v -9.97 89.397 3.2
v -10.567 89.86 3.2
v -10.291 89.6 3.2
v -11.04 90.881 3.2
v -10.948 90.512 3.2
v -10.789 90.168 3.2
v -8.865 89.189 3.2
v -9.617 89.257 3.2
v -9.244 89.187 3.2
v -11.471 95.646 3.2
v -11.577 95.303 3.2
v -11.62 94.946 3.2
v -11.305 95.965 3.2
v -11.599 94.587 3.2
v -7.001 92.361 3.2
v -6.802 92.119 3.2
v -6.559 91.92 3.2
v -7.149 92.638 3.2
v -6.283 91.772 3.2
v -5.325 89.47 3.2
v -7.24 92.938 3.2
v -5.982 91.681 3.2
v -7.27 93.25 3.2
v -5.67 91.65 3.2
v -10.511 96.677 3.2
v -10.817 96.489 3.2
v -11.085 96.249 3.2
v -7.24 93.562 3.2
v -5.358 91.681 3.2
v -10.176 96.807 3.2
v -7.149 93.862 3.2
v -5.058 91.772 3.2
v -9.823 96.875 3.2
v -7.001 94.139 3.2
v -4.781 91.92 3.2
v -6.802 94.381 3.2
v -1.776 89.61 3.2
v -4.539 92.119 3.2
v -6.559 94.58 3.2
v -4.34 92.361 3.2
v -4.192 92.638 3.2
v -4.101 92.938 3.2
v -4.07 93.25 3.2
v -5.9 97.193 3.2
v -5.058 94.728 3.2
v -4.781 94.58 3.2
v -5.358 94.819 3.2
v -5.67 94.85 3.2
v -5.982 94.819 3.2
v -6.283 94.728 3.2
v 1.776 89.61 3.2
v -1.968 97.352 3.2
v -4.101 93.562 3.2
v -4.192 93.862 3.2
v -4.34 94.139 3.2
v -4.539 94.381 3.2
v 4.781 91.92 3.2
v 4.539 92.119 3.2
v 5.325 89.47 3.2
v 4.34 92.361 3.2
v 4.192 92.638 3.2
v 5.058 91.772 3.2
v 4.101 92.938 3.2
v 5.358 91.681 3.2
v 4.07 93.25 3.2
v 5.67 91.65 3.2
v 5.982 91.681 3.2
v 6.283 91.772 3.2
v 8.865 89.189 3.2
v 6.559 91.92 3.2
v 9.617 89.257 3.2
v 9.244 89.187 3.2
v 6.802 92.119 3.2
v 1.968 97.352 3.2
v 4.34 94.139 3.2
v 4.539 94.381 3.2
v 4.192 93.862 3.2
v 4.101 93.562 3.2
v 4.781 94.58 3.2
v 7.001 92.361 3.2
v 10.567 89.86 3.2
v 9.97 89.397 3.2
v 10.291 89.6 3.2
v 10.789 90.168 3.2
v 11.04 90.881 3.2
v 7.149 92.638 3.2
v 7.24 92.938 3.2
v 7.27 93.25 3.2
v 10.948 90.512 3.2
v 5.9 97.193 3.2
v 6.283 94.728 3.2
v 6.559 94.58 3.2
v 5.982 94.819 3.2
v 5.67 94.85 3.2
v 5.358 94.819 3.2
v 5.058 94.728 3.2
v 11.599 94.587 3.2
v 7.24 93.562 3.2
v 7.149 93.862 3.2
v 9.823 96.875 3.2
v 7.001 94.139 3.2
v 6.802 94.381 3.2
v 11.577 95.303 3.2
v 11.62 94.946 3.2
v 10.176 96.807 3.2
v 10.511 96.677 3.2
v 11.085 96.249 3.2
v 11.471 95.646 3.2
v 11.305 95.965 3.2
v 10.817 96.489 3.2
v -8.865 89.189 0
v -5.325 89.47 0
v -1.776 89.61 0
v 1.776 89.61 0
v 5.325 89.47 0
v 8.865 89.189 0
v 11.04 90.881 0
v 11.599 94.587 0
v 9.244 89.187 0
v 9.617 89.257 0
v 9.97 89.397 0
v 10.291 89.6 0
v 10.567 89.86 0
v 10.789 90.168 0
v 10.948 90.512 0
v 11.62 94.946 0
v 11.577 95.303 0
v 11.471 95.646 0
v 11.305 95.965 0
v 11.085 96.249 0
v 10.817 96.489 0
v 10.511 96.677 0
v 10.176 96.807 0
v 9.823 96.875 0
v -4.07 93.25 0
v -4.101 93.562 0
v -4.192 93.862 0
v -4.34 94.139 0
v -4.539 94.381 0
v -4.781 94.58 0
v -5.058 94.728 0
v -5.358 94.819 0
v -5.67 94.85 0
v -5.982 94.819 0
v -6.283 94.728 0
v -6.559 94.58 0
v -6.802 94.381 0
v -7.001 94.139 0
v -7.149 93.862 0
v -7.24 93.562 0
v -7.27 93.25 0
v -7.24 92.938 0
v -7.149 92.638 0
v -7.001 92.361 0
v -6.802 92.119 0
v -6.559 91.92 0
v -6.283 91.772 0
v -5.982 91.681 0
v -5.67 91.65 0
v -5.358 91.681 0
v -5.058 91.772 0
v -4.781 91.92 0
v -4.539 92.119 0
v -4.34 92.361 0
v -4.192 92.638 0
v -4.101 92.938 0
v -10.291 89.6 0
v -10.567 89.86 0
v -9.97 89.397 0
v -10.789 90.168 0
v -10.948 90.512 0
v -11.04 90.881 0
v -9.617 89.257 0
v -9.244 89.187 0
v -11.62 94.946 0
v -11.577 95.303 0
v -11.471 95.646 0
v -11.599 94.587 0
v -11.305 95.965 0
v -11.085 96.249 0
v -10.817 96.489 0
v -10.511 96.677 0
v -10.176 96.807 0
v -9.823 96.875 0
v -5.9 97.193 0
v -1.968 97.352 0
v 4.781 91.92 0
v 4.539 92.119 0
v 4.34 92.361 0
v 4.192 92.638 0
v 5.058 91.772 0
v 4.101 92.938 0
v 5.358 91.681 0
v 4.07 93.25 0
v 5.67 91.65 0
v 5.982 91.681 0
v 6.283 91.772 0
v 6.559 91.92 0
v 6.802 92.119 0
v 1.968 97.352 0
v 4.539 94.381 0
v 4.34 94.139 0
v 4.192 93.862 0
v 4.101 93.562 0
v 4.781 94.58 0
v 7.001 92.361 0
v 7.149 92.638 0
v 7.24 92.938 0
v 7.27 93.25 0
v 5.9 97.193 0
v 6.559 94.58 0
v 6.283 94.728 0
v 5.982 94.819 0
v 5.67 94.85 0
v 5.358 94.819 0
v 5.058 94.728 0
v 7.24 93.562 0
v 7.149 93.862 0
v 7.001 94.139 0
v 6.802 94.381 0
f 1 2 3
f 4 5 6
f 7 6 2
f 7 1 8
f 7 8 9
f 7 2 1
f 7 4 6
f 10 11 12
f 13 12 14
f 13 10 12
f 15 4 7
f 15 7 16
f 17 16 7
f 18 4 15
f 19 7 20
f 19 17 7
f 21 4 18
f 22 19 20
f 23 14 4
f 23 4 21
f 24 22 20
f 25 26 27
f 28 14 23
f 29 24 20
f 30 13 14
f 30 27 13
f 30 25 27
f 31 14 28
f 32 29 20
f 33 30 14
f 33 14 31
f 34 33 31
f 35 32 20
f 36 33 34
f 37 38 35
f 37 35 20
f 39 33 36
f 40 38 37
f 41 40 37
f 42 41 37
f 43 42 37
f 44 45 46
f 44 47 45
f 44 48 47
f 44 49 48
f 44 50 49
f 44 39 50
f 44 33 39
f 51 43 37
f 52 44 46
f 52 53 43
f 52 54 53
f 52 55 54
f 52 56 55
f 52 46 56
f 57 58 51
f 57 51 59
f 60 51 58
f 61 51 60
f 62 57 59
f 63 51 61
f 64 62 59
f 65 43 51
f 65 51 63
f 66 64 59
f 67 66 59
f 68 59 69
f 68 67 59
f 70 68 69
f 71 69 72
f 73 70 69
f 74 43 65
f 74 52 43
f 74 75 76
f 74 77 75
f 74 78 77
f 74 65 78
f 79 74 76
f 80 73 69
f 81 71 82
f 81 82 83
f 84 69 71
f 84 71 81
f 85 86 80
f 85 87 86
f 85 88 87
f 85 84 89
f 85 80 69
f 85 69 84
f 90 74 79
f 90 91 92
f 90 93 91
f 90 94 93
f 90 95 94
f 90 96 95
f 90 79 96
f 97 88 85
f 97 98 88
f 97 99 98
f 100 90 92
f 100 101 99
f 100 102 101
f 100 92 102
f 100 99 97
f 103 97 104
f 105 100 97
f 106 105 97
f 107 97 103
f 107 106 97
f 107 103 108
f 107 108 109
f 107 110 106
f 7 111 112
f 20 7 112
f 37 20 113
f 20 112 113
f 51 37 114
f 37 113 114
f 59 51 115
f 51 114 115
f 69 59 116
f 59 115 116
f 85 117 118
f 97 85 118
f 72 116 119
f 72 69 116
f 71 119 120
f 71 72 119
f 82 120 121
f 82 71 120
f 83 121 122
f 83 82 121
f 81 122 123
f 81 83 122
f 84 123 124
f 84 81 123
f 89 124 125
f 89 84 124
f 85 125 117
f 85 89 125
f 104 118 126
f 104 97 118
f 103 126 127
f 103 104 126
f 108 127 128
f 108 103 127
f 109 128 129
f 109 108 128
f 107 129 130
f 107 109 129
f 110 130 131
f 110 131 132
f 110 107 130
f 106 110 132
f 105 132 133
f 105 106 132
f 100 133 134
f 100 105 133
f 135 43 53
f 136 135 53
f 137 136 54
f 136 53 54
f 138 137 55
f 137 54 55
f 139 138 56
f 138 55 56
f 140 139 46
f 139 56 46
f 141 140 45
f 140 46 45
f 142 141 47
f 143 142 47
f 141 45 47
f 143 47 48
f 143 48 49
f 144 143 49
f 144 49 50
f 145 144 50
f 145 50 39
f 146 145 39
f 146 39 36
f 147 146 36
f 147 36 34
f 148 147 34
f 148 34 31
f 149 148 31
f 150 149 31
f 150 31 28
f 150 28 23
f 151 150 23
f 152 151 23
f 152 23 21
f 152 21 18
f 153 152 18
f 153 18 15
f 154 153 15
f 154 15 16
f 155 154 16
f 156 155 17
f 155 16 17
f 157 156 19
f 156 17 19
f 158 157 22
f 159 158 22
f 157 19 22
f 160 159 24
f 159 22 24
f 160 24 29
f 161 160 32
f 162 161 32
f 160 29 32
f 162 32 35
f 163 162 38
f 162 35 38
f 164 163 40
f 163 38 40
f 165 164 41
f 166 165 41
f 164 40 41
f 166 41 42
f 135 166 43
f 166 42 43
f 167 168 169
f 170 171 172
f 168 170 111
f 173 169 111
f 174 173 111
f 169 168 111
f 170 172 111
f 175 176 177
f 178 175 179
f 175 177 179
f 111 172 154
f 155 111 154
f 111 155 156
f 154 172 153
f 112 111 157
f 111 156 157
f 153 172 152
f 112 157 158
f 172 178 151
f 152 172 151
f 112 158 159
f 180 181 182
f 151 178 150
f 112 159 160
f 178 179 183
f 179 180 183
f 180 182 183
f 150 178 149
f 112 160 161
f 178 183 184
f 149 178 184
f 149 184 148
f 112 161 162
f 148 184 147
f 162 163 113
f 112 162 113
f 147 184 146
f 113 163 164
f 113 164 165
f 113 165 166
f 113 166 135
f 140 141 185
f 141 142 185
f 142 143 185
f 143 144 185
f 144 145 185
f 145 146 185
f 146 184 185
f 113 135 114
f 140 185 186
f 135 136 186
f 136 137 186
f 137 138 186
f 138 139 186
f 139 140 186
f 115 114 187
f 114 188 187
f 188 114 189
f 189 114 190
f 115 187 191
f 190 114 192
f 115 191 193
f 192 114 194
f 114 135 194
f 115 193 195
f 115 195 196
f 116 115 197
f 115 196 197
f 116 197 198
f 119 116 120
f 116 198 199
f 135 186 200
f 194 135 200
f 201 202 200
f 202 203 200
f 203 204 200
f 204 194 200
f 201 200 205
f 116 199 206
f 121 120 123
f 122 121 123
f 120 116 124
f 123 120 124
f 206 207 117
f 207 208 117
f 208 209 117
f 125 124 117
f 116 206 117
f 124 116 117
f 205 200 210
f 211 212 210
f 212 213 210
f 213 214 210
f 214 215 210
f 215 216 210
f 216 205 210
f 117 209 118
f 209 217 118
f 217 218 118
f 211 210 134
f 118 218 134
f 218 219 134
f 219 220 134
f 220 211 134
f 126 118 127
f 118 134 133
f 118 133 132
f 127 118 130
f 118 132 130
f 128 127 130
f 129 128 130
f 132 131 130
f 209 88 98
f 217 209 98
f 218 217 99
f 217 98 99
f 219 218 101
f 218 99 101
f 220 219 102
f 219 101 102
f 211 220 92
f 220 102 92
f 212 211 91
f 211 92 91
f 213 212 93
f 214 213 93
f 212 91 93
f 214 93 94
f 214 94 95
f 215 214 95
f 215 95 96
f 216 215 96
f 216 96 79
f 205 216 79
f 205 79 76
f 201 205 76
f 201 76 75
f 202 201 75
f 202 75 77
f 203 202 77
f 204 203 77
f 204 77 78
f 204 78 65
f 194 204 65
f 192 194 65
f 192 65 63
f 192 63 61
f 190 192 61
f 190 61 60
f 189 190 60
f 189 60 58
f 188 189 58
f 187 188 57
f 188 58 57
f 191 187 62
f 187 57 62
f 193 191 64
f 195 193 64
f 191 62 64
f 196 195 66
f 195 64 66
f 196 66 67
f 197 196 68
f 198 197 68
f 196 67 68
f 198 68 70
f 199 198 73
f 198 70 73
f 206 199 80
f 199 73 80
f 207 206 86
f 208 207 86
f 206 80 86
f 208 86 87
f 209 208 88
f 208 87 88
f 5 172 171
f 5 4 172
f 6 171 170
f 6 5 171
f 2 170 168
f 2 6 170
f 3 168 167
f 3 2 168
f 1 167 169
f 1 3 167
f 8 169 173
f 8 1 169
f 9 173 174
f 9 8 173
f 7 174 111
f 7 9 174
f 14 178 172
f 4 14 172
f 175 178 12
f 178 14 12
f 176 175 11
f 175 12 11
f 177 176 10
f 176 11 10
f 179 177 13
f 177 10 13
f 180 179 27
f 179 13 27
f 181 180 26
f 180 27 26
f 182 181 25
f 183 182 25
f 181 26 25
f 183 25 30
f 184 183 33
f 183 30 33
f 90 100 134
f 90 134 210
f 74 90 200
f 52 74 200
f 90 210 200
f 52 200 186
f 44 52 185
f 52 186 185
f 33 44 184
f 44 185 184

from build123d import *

# Parameters (mm, degrees)
BOSS_EXTRUDE1_DEPTH = 3.2
FILLET1_R           = 2
SKETCH2_R           = 1.6
CUT_EXTRUDE1_DEPTH  = 99.11525581


with BuildPart() as part:
    # Sketch1 → Boss-Extrude1 (new body)
    with BuildSketch(Plane.XY):
        with BuildLine():
            Line((-11.908609546, 96.641044089), (-10.753969279, 88.980506454))
            ThreePointArc((-10.753969279, 88.980506454), (0, 89.628), (10.753969279, 88.980506454))
            Line((10.753969279, 88.980506454), (11.908609546, 96.641044089))
            ThreePointArc((11.908609546, 96.641044089), (0, 97.372), (-11.908609546, 96.641044089))
        make_face()
    extrude(amount=BOSS_EXTRUDE1_DEPTH)

    # Fillet1
    fillet1_edges = [part.edges().sort_by_distance(p)[0] for p in [
        (11.908609546, 96.641044089, 1.6),
        (10.753969279, 88.980506454, 1.6),
        (-10.753969279, 88.980506454, 1.6),
        (-11.908609546, 96.641044089, 1.6),
    ]]
    fillet(fillet1_edges, radius=FILLET1_R)

    # Sketch2 → Cut-Extrude1 (cut, through all)
    with BuildSketch(Plane.XY.offset(3.2)):
        with Locations((-5.670312341, 93.250077468)):
            Circle(SKETCH2_R)
        with Locations((5.670312341, 93.250077468)):
            Circle(SKETCH2_R)
    extrude(amount=-CUT_EXTRUDE1_DEPTH, mode=Mode.SUBTRACT)


solid = part.part
